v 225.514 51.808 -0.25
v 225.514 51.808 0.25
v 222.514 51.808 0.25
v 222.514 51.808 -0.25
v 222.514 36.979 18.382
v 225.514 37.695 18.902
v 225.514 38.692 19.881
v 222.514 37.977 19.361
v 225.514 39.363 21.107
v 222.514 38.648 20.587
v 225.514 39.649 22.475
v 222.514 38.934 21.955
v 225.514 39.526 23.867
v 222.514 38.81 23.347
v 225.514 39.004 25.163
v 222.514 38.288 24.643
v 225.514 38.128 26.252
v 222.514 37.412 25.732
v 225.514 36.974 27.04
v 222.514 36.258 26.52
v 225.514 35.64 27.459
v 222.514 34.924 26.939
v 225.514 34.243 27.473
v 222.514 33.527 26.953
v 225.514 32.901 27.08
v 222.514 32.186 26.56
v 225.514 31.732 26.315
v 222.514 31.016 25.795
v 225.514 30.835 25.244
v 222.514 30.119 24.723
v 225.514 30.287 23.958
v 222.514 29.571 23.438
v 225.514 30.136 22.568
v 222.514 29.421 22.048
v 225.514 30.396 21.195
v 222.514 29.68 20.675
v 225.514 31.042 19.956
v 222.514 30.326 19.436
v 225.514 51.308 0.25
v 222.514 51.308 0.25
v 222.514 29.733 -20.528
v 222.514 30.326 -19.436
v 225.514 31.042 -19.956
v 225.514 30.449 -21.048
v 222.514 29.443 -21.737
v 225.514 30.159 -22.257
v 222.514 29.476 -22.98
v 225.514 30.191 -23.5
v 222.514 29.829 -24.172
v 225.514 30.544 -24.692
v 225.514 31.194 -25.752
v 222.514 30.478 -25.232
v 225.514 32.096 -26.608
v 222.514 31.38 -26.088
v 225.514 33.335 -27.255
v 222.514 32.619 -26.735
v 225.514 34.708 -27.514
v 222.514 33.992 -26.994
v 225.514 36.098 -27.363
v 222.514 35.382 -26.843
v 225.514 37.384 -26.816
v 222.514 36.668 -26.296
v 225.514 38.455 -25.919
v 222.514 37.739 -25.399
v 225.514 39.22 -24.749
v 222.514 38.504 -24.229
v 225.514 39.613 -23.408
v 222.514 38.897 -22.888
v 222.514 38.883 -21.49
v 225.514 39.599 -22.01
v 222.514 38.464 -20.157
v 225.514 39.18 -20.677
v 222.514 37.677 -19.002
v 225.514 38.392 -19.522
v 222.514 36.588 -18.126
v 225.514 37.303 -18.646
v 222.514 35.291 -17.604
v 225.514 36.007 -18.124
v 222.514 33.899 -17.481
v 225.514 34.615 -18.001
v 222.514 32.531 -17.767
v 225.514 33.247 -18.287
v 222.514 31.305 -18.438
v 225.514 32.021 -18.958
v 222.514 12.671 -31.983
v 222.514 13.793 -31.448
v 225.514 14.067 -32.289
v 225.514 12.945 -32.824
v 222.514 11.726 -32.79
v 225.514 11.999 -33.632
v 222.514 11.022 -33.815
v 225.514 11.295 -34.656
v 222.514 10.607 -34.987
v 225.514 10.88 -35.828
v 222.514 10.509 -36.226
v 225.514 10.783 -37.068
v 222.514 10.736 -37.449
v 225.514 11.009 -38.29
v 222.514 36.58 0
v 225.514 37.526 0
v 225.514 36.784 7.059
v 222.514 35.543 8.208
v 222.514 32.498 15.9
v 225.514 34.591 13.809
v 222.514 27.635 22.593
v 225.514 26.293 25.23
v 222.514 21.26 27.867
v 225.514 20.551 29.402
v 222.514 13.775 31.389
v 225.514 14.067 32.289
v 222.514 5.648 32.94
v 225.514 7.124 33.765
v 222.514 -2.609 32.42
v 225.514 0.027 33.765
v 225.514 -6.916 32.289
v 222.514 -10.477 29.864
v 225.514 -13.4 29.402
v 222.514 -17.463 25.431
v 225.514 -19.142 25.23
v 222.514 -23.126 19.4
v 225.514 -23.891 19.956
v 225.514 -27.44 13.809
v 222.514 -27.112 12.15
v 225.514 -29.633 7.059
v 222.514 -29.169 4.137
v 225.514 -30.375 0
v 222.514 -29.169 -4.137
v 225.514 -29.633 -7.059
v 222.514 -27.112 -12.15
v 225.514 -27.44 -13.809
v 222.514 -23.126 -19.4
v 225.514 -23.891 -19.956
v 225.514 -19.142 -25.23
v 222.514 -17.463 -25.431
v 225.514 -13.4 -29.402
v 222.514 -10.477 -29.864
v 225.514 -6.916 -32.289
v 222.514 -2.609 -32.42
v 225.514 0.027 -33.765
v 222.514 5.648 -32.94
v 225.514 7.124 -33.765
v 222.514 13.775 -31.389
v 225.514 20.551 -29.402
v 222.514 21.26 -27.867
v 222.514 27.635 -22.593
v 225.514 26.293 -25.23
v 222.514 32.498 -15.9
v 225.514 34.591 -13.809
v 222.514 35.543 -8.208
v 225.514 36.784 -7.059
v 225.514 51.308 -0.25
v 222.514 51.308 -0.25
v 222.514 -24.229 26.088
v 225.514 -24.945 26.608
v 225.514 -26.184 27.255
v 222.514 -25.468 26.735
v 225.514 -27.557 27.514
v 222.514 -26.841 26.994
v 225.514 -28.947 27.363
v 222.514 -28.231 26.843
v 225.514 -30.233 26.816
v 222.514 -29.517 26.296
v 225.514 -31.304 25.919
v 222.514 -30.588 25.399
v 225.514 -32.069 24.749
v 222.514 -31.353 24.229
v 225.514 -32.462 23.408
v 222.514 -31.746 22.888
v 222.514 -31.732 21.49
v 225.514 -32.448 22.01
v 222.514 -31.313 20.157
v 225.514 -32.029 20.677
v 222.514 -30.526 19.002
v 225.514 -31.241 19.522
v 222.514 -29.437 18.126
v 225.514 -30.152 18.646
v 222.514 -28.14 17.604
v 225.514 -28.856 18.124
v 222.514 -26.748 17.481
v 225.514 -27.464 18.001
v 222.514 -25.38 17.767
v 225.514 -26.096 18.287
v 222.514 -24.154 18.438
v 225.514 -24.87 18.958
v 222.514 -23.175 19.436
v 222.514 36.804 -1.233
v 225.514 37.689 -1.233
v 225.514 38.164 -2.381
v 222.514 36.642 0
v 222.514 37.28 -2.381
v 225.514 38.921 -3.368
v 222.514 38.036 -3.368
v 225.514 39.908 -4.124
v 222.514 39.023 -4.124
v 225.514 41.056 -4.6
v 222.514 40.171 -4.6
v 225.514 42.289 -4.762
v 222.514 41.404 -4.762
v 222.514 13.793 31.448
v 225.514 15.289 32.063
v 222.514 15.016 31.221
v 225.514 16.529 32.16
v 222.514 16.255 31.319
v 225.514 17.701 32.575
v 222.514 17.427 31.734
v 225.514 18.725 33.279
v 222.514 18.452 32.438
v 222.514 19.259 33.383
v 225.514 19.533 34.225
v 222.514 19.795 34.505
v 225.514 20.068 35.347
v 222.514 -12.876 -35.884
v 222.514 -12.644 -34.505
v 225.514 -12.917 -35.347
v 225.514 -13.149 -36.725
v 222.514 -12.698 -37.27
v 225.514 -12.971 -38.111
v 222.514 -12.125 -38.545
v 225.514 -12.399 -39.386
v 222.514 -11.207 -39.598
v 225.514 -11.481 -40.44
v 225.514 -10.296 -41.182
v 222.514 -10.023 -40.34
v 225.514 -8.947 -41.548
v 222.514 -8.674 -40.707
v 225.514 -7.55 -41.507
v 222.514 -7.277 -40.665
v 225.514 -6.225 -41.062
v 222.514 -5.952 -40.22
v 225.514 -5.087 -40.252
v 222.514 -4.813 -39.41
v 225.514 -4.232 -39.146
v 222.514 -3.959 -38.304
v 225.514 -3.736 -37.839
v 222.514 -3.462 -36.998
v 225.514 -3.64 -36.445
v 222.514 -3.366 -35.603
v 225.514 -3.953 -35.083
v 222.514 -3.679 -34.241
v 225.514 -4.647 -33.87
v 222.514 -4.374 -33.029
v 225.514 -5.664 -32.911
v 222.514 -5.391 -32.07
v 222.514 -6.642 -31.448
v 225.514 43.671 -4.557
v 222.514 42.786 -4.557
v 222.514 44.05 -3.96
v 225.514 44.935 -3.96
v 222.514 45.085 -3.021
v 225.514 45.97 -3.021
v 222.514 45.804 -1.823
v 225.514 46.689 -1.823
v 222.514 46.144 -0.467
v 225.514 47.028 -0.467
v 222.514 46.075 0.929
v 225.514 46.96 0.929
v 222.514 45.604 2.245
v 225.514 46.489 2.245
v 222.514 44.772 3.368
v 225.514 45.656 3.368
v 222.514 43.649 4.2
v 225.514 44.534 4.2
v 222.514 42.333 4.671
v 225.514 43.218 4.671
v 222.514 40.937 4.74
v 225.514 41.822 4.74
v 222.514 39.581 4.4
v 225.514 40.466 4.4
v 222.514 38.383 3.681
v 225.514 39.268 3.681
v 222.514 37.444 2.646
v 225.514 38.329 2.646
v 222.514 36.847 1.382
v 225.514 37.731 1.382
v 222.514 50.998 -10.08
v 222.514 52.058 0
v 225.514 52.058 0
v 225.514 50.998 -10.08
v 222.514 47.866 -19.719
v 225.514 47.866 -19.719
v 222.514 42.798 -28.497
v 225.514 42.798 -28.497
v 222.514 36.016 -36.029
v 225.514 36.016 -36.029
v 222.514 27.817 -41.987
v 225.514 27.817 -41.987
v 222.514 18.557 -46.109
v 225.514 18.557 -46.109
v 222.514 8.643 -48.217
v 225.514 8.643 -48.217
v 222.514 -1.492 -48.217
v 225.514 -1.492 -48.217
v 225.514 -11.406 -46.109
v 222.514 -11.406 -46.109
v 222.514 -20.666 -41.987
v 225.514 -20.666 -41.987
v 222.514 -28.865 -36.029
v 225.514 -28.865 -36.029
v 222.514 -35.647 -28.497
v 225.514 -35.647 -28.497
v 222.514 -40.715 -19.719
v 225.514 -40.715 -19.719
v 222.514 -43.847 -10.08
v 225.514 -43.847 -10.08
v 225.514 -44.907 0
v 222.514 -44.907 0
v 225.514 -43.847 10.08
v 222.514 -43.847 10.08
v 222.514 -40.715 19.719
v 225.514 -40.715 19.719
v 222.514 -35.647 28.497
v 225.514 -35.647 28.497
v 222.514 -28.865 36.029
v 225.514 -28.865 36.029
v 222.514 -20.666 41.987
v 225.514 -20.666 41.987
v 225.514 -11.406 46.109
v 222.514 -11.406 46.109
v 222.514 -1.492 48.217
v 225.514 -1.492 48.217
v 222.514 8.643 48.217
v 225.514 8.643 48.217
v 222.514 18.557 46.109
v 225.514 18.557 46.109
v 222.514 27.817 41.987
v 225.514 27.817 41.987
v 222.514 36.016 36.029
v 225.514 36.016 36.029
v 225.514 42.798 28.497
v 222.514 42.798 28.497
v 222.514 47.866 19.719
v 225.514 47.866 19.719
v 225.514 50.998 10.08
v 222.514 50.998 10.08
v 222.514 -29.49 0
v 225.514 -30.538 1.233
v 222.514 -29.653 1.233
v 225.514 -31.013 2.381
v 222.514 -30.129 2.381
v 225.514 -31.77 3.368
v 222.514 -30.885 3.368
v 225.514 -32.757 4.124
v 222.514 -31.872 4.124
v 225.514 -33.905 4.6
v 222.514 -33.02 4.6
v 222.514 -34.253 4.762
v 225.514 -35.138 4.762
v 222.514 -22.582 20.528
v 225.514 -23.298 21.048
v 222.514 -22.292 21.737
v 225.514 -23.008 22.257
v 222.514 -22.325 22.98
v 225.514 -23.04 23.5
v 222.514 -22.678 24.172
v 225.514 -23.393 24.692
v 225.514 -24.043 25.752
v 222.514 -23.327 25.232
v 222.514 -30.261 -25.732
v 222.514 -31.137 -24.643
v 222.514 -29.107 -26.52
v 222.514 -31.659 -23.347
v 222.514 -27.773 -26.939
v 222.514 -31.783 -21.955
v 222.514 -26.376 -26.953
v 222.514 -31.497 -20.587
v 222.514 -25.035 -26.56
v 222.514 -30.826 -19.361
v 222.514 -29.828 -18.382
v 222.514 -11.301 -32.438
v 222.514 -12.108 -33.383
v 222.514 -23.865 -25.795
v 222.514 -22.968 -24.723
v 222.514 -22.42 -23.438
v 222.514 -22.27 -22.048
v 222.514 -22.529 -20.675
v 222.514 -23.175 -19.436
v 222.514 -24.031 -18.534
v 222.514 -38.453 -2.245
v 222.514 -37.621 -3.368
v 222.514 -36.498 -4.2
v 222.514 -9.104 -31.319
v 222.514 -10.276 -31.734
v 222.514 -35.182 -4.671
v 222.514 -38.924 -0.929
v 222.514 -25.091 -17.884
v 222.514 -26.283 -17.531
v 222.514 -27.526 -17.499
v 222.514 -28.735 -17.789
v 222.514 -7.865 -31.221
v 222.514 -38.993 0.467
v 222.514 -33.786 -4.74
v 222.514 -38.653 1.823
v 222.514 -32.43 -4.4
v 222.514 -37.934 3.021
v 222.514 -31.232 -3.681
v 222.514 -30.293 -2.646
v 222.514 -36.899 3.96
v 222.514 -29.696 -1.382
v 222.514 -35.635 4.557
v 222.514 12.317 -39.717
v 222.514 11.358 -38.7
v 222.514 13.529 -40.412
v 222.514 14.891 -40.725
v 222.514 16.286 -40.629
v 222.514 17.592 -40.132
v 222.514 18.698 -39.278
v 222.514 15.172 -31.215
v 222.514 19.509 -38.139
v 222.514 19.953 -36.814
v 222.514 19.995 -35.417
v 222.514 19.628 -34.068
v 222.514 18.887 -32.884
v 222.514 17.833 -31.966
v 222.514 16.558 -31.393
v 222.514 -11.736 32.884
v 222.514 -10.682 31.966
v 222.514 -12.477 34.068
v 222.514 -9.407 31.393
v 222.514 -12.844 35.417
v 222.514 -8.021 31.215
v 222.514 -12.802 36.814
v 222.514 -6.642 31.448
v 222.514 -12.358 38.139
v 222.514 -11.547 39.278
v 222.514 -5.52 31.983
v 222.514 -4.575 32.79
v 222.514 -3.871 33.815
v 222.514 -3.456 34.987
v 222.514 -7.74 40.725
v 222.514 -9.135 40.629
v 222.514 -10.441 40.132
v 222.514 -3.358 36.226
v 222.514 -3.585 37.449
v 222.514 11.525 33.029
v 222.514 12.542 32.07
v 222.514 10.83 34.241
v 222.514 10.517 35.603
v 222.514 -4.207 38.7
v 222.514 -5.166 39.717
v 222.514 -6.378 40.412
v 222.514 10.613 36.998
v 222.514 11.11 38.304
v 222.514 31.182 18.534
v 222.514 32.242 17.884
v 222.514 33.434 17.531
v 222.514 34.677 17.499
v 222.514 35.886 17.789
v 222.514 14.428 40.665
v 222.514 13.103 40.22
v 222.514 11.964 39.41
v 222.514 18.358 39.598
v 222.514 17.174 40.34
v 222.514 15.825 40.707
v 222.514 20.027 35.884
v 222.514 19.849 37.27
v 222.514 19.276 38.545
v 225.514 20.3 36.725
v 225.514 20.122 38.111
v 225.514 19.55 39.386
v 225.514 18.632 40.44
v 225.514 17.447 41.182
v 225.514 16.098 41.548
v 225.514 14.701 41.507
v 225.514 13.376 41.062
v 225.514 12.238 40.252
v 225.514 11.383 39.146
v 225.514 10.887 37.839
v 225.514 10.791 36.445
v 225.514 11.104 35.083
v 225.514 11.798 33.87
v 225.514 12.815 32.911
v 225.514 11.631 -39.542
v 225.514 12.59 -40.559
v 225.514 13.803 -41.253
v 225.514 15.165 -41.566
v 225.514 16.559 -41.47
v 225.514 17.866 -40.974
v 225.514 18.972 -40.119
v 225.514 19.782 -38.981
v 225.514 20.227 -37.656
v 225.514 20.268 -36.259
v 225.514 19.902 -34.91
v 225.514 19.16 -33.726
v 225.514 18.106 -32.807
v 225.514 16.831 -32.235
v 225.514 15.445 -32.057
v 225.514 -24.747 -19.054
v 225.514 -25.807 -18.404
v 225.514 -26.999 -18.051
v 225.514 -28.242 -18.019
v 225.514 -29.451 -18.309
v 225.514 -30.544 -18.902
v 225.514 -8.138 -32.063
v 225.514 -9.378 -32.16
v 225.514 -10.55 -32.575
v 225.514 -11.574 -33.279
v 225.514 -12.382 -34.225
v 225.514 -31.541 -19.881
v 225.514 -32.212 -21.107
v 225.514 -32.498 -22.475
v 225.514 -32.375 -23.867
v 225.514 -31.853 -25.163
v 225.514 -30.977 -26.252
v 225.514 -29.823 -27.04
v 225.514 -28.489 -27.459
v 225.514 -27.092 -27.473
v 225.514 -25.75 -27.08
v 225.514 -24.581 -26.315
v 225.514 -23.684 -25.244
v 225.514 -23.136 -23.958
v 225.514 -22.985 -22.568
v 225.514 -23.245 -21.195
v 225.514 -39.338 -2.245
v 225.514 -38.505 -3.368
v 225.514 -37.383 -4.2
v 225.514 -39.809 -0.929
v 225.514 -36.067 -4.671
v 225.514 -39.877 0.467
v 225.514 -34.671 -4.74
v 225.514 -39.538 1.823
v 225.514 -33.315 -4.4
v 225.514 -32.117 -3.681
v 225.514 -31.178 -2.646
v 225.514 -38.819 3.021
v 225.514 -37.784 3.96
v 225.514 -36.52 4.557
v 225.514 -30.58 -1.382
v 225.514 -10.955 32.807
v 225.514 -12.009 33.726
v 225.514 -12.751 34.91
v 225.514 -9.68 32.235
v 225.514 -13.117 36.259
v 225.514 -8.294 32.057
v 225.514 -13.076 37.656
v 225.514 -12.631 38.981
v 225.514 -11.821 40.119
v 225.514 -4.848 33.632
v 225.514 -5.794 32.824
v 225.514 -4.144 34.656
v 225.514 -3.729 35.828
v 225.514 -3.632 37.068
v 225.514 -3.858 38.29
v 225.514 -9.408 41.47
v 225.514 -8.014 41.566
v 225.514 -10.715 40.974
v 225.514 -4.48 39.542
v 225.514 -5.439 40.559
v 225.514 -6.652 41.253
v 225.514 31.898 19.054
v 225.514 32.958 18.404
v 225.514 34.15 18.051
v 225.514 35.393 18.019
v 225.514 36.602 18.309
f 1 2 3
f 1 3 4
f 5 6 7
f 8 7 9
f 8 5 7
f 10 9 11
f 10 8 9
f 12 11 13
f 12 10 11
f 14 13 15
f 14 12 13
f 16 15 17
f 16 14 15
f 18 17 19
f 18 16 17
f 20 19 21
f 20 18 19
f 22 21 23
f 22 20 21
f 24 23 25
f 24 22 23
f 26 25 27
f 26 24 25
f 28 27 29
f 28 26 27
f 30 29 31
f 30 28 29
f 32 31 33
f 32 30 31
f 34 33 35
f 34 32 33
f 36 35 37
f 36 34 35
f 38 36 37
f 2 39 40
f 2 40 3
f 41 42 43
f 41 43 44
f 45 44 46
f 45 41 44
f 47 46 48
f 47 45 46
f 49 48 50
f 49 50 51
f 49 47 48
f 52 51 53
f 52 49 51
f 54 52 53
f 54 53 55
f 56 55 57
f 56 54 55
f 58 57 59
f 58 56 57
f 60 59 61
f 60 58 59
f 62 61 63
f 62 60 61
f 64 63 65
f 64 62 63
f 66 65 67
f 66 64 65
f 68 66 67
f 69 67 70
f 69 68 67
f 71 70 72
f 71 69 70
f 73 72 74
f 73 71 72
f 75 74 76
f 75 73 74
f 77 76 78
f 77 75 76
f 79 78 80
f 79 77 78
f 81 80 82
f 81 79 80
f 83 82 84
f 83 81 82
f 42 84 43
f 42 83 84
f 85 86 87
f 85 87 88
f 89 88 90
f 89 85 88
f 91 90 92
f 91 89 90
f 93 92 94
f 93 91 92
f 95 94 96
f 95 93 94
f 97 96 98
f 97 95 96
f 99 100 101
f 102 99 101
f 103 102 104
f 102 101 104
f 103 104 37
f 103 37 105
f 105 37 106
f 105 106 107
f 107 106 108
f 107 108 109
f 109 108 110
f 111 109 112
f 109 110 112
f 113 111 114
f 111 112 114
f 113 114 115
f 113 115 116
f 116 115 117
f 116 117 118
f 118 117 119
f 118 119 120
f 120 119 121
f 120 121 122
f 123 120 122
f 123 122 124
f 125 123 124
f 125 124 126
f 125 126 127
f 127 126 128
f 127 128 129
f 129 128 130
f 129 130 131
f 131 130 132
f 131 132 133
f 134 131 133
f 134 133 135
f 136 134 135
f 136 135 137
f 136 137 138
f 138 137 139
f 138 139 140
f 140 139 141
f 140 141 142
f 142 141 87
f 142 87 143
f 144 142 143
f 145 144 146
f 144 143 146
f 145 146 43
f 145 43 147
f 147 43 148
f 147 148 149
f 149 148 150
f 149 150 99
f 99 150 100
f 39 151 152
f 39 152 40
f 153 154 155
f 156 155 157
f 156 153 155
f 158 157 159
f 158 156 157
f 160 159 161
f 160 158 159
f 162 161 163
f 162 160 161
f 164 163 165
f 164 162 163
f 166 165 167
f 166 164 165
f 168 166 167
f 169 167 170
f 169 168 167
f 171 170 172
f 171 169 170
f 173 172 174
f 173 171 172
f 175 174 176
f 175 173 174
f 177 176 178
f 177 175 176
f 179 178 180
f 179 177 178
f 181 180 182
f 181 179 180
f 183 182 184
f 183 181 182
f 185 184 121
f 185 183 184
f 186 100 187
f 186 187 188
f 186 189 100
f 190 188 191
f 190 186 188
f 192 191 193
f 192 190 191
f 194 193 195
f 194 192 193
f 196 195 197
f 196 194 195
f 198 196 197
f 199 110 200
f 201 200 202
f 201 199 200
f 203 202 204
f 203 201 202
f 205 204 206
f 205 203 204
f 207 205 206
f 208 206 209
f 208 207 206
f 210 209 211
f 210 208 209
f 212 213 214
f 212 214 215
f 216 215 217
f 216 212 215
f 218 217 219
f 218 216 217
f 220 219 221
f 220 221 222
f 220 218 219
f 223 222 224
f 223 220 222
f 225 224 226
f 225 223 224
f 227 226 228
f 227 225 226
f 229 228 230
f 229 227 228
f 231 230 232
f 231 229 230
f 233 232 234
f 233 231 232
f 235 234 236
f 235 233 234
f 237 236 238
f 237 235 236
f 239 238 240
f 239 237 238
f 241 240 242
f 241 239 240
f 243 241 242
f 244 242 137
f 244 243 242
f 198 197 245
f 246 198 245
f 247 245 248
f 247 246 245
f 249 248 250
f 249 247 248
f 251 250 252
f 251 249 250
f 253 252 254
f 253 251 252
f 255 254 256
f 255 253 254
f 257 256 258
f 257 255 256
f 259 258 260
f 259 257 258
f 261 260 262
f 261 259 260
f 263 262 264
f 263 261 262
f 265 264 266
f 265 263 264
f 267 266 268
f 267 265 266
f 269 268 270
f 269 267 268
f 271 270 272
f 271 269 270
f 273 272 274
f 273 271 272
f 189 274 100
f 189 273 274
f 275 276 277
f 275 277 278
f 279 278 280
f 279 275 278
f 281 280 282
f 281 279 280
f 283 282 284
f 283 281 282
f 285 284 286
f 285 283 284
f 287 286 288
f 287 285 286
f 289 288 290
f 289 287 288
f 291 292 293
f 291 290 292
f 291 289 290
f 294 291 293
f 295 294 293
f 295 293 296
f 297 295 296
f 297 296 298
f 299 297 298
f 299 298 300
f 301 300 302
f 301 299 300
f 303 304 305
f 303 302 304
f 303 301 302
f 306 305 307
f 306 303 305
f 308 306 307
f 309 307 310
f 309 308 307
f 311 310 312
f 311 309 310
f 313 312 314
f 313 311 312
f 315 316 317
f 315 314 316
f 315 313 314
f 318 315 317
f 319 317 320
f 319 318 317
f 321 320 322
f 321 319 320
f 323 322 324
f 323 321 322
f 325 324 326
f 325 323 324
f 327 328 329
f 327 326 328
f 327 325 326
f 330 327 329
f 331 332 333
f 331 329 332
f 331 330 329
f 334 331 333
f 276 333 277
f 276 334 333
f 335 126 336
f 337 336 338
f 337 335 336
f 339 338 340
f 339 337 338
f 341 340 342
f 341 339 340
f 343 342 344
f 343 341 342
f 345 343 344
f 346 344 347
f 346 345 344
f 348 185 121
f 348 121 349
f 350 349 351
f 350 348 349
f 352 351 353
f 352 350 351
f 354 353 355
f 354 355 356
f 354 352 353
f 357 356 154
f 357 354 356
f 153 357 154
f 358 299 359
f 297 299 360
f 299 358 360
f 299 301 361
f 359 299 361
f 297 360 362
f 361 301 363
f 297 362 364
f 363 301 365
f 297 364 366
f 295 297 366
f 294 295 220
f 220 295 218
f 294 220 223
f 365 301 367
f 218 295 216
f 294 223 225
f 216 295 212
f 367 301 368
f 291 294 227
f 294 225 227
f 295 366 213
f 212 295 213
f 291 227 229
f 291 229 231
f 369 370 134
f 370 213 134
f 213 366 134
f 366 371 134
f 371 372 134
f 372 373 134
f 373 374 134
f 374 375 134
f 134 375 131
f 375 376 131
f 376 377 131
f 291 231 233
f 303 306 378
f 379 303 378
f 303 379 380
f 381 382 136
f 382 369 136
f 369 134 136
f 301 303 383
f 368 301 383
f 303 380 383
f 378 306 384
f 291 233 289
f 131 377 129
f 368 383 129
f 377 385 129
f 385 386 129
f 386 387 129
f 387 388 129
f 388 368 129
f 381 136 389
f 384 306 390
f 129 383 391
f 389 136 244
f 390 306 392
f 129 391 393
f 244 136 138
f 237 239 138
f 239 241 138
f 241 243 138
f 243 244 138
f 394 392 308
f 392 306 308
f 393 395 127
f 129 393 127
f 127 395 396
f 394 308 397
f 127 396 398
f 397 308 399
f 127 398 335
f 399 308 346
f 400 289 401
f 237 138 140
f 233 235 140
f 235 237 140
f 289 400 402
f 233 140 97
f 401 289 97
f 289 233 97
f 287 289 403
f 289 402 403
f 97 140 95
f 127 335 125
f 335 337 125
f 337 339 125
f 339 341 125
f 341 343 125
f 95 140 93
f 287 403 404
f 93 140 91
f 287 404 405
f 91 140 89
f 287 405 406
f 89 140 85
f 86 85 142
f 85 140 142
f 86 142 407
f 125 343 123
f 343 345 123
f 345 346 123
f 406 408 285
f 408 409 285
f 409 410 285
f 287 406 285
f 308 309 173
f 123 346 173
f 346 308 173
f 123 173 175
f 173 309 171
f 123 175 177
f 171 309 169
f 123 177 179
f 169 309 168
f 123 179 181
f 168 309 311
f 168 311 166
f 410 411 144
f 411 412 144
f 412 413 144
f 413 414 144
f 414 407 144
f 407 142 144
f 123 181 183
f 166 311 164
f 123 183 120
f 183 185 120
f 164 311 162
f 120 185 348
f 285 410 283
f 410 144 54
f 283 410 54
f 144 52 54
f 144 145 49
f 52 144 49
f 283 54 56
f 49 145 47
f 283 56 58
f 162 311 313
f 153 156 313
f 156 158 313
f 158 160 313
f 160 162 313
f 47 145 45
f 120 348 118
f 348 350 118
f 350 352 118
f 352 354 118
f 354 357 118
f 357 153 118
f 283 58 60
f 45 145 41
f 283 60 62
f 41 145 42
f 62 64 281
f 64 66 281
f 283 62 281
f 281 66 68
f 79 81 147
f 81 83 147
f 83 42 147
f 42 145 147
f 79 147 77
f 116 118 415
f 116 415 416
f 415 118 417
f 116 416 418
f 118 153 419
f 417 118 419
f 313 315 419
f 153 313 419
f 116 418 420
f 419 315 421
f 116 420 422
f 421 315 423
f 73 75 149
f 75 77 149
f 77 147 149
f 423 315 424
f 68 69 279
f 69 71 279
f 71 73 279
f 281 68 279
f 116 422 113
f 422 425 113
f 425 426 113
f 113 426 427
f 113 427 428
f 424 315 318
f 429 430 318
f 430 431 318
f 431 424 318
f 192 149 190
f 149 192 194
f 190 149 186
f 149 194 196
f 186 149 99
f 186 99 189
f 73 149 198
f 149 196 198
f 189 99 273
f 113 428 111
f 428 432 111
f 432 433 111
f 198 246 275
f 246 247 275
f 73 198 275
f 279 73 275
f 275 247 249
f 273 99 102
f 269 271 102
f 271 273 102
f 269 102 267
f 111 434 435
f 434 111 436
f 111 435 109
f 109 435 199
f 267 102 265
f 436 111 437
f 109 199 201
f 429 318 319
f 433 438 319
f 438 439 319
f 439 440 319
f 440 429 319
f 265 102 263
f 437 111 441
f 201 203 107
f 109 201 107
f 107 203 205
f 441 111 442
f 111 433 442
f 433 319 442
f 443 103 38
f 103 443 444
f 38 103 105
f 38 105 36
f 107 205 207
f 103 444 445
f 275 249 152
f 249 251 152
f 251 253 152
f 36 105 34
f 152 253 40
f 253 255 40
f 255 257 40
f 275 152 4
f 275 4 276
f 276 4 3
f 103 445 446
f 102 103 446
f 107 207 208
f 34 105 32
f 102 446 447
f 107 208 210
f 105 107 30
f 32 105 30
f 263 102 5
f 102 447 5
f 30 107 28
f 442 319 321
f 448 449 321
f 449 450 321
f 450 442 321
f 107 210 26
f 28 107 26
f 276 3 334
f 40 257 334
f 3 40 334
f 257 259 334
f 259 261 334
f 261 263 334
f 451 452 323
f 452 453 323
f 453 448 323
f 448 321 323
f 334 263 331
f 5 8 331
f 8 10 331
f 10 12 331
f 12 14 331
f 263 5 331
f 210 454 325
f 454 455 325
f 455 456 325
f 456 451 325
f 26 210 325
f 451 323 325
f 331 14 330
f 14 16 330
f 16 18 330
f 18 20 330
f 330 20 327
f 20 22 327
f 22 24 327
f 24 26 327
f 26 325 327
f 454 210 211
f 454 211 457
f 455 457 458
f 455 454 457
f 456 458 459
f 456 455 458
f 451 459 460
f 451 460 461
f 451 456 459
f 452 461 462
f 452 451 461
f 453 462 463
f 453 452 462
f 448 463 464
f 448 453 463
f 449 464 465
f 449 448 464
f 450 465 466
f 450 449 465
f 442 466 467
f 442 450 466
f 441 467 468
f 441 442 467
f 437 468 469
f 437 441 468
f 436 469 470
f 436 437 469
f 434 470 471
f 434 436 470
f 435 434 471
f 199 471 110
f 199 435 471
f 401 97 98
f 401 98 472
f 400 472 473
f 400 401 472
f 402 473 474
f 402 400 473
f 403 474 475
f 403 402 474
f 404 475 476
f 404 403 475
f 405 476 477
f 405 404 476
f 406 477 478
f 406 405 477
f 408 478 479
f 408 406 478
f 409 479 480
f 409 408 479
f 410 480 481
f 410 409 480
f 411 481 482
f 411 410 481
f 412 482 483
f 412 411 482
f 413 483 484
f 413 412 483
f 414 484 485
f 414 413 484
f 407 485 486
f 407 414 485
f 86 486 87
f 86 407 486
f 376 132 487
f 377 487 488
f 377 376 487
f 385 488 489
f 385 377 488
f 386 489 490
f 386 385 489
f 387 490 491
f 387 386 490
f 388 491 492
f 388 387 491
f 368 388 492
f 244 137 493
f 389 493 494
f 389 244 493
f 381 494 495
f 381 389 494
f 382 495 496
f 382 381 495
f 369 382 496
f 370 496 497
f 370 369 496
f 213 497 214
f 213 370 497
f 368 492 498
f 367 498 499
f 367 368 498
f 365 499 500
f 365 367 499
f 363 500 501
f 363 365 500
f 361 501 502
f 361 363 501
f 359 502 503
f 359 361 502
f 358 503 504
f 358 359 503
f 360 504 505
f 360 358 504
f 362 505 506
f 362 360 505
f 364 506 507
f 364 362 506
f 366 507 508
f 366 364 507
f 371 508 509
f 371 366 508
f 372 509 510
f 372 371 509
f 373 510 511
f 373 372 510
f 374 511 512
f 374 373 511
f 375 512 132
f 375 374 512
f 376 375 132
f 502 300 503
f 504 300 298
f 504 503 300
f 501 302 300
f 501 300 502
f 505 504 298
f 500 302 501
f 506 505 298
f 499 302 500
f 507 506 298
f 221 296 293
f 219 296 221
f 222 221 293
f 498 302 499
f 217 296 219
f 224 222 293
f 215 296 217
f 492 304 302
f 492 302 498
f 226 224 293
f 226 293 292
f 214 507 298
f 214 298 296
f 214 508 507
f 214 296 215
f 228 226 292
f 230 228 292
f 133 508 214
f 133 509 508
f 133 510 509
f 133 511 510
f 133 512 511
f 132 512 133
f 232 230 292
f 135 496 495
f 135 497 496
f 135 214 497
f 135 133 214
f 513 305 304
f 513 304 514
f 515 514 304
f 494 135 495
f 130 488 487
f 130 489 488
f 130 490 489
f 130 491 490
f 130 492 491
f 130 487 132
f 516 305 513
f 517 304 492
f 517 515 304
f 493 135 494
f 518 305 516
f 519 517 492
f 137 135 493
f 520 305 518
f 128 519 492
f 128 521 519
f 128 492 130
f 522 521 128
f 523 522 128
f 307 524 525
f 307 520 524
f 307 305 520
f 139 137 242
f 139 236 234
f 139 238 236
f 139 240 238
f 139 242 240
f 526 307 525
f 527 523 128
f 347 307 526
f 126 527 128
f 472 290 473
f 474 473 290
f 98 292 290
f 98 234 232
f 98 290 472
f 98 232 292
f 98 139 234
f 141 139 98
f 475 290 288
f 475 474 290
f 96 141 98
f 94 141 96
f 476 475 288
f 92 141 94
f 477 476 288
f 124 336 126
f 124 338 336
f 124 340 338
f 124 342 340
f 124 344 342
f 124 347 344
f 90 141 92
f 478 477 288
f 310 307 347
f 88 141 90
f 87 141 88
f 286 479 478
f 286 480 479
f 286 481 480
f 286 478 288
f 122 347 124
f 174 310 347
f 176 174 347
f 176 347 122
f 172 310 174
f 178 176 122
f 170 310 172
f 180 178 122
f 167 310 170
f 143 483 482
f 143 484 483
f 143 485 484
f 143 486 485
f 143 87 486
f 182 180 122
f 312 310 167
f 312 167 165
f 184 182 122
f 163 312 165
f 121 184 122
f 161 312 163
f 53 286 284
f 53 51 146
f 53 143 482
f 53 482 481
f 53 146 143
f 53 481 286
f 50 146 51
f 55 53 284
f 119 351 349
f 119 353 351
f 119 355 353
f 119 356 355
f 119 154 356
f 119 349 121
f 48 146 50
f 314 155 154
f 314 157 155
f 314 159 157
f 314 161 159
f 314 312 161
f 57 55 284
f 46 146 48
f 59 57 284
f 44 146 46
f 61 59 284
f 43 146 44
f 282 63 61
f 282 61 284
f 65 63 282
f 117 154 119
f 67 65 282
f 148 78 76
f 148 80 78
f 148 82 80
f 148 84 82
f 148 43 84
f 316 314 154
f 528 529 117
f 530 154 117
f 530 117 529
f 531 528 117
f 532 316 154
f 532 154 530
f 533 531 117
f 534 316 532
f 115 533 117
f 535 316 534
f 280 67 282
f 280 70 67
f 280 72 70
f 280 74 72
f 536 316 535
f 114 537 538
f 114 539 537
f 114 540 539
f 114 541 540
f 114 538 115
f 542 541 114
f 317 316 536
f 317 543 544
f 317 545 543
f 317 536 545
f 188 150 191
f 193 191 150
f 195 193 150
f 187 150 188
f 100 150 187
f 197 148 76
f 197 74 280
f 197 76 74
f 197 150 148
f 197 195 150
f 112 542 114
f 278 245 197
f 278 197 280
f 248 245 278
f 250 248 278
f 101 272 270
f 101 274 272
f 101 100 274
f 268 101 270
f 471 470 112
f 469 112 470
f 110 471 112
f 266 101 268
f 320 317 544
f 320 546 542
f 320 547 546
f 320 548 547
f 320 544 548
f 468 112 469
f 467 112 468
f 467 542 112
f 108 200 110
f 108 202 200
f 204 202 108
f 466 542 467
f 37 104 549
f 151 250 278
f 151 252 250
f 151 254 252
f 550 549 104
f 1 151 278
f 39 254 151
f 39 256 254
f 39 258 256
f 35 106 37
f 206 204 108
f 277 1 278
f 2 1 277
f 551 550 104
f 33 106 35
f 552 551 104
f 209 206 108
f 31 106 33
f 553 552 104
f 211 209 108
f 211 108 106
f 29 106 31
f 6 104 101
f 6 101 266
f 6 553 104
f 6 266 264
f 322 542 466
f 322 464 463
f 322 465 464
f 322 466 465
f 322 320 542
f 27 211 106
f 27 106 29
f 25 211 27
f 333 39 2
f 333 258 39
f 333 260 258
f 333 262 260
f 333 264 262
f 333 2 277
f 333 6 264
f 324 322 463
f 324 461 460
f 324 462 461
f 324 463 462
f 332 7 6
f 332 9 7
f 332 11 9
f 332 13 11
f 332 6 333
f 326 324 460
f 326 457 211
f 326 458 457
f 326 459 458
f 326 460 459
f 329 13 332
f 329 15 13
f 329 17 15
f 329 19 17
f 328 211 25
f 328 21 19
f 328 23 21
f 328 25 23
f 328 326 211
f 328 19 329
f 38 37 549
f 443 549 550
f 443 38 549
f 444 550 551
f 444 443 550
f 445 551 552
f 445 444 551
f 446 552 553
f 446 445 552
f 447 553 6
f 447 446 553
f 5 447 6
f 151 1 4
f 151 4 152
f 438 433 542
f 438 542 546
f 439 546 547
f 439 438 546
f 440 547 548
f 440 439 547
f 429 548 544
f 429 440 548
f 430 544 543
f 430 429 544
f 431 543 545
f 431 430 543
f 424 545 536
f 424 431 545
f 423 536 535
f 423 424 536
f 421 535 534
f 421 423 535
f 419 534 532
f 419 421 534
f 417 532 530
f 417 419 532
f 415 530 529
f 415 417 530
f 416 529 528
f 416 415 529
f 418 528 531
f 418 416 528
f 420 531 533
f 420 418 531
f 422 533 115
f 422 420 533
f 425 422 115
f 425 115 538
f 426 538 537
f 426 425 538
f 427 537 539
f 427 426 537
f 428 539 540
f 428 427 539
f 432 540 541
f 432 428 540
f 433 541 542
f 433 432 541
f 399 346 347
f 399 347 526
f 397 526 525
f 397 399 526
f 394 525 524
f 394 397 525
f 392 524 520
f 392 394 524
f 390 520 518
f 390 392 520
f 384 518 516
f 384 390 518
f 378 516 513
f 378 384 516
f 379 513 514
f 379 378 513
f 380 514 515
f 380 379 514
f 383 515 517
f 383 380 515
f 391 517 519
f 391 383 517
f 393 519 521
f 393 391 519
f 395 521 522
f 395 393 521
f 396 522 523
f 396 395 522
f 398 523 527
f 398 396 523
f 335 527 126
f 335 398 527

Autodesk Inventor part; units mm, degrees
ref_plane "YZ Plane" through (0, 0, 0) normal (1, 0, 0) x (0, 1, 0)
ref_plane "XZ Plane" through (0, 0, 0) normal (0, 1, 0) x (-1, 0, 0)
ref_plane "XY Plane" through (0, 0, 0) normal (0, 0, 1) x (1, 0, 0)
sketch "Sketch1" plane through (0, 0, 0) normal (0, 0, 1) x (1, 0, 0)
  arc A0 (180.1312, 23.4516) -> (181.5833, 23.6751) centre (180.1312, 28.2803) ccw
  arc A1 (180.1312, 23.4516) -> (181.5842, 23.6753) centre (180.1312, 28.2803) ccw
  arc A2 (180.1312, 21.4516) -> (182.1847, 21.7676) centre (180.1312, 28.2803) ccw
  arc A3 (167.724, 26.7761) -> (180.1312, 23.4516) centre (180.1312, 48.266) ccw
  arc A4 (166.724, 25.044) -> (180.1312, 21.4516) centre (180.1312, 48.266) ccw
  arc A5 (166.724, 53.0576) -> (167.724, 52.0576) centre (167.724, 53.0576) ccw
  line L0 (233.0254, 52.0576) -> (167.724, 52.0576)
  line L1 (233.0254, 54.0576) -> (169.724, 54.0576)
  line L2 (182.1847, 21.7676) -> (237.115, 39.0871)
  line L3 (236.5136, 40.9945) -> (181.5833, 23.6751)
  line L4 (168.724, 25.044) -> (168.724, 31.7835)
  line L5 (166.724, 25.044) -> (166.724, -4.6444)
  line L6 (236.5136, 40.9945) -> (237.115, 39.0871)
  line L7 (233.0254, 52.0576) -> (237.115, 52.0576)
  line L8 (233.0254, 54.0576) -> (237.115, 54.0576)
  line L9 (237.115, 52.0576) -> (237.115, 54.0576)
  line L10 (0, 3.5755) -> (319.1694, 3.5755)
  line L11 (0, 88.1805) -> (30.0219, 88.1805)
  line L12 (30.0219, 90.1805) -> (0, 90.1805)
  line L13 (0, 88.1805) -> (0, 90.1805)
  line L14 (0, 77.0805) -> (30.0219, 77.0805)
  line L15 (0, 75.0805) -> (30.0219, 75.0805)
  line L16 (124.3912, 51.7943) -> (167.724, 26.7761)
  line L17 (123.3912, 50.0622) -> (166.724, 25.044)
  line L18 (166.724, 25.044) -> (166.724, 31.1529)
  arc A6 (123.3912, 50.0622) -> (30.0219, 75.0805) centre (30.0219, -111.6581) ccw
  arc A7 (124.3912, 51.7943) -> (30.0219, 77.0805) centre (30.0219, -111.6581) ccw
  line L19 (30.0219, 88.1805) -> (165.724, 88.1805)
  line L20 (167.724, 90.1805) -> (30.0219, 90.1805)
  line L21 (166.724, 53.0576) -> (166.724, 87.1805)
  line L22 (168.724, 55.0576) -> (168.724, 89.1805)
  arc A8 (168.724, 55.0576) -> (169.724, 54.0576) centre (169.724, 55.0576) ccw
  arc A9 (166.724, 87.1805) -> (165.724, 88.1805) centre (165.724, 87.1805) ccw
  arc A10 (168.724, 89.1805) -> (167.724, 90.1805) centre (167.724, 89.1805) ccw
  line L23 (236.5136, 40.9945) -> (236.5136, 52.0576)
  line L24 (236.5136, 52.0576) -> (233.5136, 52.0576)
  line L25 (233.5136, 52.0576) -> (233.5136, 40.0486)
  line L26 (233.5136, 52.0576) -> (225.5136, 52.0576)
  line L27 (225.5136, 52.0576) -> (225.5136, 37.5262)
  line L28 (225.5136, 52.0576) -> (222.5136, 52.0576)
  line L29 (222.5136, 52.0576) -> (222.5136, 36.5803)
  line L30 (233.0254, 52.0576) -> (225.5136, 49.6892)
  line L31 (222.5136, 48.7433) -> (144.4694, 24.136)
  dimension "d18" = 30.0219
  dimension "d19" = 186.7386
  dimension "d20" = 0
  dimension "d21" = 0
  dimension "d22" = 71.505
  dimension "d23" = 2
  dimension "d24" = 2
  dimension "d25" = 2
  dimension "d26" = 2
  dimension "d27" = 2
  dimension "d28" = 17.5
  dimension "d29" = 54.9303
  dimension "d30" = 2
  dimension "d31" = 11.1
  dimension "d32" = 11.6
  dimension "d34" = 2
  dimension "d35" = 2
  dimension "d36" = 1
  dimension "d37" = 1
  dimension "d38" = 1
  dimension "d39" = 1
  dimension "d40" = 3
  dimension "d41" = 8
  dimension "d42" = 3
revolve "Revolution1" add sketch "Sketch1" angle 360 about axis through (0, 3.5755, 0) along (1, 0, 0) contours L29 L0 L27 L3
sketch "Sketch4" plane through (225.5136, 3.5755, 0) normal (1, 0, 0) x (0, 0, -1)
  circle A0 centre (0, 0) radius 33.9508 projected
  line L0 (0, 33.9508) -> (0, 38.7133)
  circle A1 centre (0, 38.7133) radius 4.7625
  point P0 (0, -3.5755)
  dimension "d47" = 4.7625
  dimension "d48" = 9.525
sketch "Sketch5" plane through (222.5136, 3.5755, 0) normal (-1, 0, 0) x (0, 0, 1)
  circle A0 centre (0, 0) radius 33.0049 projected
  line L0 (0, 33.0049) -> (0, 37.7674)
  circle A1 centre (0, 37.7674) radius 4.7625
  point P0 (0, -3.5755)
  dimension "d49" = 4.7625
  dimension "d50" = 9.525
sketch "Sketch6" plane through (0, 0, 0) normal (0, 0, 1) x (1, 0, 0)
  line L0 (225.5136, -44.9067) -> (225.5136, 52.0576) projected
  line L1 (225.5136, 42.2627) -> (222.5136, 41.3779)
  line L2 (222.5136, -44.9067) -> (222.5136, 52.0576) projected
  point P0 (0, 0)
sweep "Sweep1" cut profiles "Sketch4" path "Sketch6" path curves L1 contours A1
pattern_circular "Circular Pattern1" count 10 over 360 about axis through (224.0136, 3.5755, 0) along (1, 0, 0) of "Sweep1"
sketch "Sketch7" plane through (225.5136, 3.5755, 0) normal (1, 0, 0) x (0, 0, -1)
  circle A0 centre (0, 0) radius 48.4822 projected
  line L0 (0, 48.4822) -> (0, 47.9822)
  line L1 (0.25, 47.7322) -> (-0.25, 47.7322)
  line L2 (-0.25, 47.7322) -> (-0.25, 48.2322)
  line L3 (-0.25, 48.2322) -> (0.25, 48.2322)
  line L4 (0.25, 48.2322) -> (0.25, 47.7322)
  line L5 (0.25, 47.7322) -> (-0.25, 48.2322) construction
  line L6 (-0.25, 47.7322) -> (0.25, 48.2322) construction
  point P0 (0, -3.5755)
  dimension "d56" = 0.5
  dimension "d60" = 0.5
  dimension "d61" = 0.5
extrude "Extrusion1" cut sketch "Sketch7" against normal blind 10 contours L1 L2 L3 L4
properties part number "back bracket 2" material "Stainless Steel"
